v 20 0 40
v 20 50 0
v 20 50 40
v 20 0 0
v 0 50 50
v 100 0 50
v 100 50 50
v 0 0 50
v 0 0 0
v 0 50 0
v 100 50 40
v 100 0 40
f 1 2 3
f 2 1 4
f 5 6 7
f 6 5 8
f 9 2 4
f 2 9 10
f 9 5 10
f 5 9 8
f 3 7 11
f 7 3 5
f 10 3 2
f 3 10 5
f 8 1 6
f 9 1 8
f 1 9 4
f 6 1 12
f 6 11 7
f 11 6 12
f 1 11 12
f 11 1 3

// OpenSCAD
// simple l bar for support testing
//
//   ^        |----w2-----| -
//   |    -    ************ |
//   |    |    ************ h2
//   |    h1   ****         -
//   |    |    ****
//   |    -    ****
//   |        |-w1-|
//   z
//    x ---------------------------->
//
// depth is how far the model goes in y

h1 = 50;
h2 = 10;
w1 = 20;
w2 = 100;
depth = 50;

cube([ w1, depth, h1 ], false);
translate([ 0, 0, h1 - h2 ]) { cube([ w2, depth, h2 ], false); }
